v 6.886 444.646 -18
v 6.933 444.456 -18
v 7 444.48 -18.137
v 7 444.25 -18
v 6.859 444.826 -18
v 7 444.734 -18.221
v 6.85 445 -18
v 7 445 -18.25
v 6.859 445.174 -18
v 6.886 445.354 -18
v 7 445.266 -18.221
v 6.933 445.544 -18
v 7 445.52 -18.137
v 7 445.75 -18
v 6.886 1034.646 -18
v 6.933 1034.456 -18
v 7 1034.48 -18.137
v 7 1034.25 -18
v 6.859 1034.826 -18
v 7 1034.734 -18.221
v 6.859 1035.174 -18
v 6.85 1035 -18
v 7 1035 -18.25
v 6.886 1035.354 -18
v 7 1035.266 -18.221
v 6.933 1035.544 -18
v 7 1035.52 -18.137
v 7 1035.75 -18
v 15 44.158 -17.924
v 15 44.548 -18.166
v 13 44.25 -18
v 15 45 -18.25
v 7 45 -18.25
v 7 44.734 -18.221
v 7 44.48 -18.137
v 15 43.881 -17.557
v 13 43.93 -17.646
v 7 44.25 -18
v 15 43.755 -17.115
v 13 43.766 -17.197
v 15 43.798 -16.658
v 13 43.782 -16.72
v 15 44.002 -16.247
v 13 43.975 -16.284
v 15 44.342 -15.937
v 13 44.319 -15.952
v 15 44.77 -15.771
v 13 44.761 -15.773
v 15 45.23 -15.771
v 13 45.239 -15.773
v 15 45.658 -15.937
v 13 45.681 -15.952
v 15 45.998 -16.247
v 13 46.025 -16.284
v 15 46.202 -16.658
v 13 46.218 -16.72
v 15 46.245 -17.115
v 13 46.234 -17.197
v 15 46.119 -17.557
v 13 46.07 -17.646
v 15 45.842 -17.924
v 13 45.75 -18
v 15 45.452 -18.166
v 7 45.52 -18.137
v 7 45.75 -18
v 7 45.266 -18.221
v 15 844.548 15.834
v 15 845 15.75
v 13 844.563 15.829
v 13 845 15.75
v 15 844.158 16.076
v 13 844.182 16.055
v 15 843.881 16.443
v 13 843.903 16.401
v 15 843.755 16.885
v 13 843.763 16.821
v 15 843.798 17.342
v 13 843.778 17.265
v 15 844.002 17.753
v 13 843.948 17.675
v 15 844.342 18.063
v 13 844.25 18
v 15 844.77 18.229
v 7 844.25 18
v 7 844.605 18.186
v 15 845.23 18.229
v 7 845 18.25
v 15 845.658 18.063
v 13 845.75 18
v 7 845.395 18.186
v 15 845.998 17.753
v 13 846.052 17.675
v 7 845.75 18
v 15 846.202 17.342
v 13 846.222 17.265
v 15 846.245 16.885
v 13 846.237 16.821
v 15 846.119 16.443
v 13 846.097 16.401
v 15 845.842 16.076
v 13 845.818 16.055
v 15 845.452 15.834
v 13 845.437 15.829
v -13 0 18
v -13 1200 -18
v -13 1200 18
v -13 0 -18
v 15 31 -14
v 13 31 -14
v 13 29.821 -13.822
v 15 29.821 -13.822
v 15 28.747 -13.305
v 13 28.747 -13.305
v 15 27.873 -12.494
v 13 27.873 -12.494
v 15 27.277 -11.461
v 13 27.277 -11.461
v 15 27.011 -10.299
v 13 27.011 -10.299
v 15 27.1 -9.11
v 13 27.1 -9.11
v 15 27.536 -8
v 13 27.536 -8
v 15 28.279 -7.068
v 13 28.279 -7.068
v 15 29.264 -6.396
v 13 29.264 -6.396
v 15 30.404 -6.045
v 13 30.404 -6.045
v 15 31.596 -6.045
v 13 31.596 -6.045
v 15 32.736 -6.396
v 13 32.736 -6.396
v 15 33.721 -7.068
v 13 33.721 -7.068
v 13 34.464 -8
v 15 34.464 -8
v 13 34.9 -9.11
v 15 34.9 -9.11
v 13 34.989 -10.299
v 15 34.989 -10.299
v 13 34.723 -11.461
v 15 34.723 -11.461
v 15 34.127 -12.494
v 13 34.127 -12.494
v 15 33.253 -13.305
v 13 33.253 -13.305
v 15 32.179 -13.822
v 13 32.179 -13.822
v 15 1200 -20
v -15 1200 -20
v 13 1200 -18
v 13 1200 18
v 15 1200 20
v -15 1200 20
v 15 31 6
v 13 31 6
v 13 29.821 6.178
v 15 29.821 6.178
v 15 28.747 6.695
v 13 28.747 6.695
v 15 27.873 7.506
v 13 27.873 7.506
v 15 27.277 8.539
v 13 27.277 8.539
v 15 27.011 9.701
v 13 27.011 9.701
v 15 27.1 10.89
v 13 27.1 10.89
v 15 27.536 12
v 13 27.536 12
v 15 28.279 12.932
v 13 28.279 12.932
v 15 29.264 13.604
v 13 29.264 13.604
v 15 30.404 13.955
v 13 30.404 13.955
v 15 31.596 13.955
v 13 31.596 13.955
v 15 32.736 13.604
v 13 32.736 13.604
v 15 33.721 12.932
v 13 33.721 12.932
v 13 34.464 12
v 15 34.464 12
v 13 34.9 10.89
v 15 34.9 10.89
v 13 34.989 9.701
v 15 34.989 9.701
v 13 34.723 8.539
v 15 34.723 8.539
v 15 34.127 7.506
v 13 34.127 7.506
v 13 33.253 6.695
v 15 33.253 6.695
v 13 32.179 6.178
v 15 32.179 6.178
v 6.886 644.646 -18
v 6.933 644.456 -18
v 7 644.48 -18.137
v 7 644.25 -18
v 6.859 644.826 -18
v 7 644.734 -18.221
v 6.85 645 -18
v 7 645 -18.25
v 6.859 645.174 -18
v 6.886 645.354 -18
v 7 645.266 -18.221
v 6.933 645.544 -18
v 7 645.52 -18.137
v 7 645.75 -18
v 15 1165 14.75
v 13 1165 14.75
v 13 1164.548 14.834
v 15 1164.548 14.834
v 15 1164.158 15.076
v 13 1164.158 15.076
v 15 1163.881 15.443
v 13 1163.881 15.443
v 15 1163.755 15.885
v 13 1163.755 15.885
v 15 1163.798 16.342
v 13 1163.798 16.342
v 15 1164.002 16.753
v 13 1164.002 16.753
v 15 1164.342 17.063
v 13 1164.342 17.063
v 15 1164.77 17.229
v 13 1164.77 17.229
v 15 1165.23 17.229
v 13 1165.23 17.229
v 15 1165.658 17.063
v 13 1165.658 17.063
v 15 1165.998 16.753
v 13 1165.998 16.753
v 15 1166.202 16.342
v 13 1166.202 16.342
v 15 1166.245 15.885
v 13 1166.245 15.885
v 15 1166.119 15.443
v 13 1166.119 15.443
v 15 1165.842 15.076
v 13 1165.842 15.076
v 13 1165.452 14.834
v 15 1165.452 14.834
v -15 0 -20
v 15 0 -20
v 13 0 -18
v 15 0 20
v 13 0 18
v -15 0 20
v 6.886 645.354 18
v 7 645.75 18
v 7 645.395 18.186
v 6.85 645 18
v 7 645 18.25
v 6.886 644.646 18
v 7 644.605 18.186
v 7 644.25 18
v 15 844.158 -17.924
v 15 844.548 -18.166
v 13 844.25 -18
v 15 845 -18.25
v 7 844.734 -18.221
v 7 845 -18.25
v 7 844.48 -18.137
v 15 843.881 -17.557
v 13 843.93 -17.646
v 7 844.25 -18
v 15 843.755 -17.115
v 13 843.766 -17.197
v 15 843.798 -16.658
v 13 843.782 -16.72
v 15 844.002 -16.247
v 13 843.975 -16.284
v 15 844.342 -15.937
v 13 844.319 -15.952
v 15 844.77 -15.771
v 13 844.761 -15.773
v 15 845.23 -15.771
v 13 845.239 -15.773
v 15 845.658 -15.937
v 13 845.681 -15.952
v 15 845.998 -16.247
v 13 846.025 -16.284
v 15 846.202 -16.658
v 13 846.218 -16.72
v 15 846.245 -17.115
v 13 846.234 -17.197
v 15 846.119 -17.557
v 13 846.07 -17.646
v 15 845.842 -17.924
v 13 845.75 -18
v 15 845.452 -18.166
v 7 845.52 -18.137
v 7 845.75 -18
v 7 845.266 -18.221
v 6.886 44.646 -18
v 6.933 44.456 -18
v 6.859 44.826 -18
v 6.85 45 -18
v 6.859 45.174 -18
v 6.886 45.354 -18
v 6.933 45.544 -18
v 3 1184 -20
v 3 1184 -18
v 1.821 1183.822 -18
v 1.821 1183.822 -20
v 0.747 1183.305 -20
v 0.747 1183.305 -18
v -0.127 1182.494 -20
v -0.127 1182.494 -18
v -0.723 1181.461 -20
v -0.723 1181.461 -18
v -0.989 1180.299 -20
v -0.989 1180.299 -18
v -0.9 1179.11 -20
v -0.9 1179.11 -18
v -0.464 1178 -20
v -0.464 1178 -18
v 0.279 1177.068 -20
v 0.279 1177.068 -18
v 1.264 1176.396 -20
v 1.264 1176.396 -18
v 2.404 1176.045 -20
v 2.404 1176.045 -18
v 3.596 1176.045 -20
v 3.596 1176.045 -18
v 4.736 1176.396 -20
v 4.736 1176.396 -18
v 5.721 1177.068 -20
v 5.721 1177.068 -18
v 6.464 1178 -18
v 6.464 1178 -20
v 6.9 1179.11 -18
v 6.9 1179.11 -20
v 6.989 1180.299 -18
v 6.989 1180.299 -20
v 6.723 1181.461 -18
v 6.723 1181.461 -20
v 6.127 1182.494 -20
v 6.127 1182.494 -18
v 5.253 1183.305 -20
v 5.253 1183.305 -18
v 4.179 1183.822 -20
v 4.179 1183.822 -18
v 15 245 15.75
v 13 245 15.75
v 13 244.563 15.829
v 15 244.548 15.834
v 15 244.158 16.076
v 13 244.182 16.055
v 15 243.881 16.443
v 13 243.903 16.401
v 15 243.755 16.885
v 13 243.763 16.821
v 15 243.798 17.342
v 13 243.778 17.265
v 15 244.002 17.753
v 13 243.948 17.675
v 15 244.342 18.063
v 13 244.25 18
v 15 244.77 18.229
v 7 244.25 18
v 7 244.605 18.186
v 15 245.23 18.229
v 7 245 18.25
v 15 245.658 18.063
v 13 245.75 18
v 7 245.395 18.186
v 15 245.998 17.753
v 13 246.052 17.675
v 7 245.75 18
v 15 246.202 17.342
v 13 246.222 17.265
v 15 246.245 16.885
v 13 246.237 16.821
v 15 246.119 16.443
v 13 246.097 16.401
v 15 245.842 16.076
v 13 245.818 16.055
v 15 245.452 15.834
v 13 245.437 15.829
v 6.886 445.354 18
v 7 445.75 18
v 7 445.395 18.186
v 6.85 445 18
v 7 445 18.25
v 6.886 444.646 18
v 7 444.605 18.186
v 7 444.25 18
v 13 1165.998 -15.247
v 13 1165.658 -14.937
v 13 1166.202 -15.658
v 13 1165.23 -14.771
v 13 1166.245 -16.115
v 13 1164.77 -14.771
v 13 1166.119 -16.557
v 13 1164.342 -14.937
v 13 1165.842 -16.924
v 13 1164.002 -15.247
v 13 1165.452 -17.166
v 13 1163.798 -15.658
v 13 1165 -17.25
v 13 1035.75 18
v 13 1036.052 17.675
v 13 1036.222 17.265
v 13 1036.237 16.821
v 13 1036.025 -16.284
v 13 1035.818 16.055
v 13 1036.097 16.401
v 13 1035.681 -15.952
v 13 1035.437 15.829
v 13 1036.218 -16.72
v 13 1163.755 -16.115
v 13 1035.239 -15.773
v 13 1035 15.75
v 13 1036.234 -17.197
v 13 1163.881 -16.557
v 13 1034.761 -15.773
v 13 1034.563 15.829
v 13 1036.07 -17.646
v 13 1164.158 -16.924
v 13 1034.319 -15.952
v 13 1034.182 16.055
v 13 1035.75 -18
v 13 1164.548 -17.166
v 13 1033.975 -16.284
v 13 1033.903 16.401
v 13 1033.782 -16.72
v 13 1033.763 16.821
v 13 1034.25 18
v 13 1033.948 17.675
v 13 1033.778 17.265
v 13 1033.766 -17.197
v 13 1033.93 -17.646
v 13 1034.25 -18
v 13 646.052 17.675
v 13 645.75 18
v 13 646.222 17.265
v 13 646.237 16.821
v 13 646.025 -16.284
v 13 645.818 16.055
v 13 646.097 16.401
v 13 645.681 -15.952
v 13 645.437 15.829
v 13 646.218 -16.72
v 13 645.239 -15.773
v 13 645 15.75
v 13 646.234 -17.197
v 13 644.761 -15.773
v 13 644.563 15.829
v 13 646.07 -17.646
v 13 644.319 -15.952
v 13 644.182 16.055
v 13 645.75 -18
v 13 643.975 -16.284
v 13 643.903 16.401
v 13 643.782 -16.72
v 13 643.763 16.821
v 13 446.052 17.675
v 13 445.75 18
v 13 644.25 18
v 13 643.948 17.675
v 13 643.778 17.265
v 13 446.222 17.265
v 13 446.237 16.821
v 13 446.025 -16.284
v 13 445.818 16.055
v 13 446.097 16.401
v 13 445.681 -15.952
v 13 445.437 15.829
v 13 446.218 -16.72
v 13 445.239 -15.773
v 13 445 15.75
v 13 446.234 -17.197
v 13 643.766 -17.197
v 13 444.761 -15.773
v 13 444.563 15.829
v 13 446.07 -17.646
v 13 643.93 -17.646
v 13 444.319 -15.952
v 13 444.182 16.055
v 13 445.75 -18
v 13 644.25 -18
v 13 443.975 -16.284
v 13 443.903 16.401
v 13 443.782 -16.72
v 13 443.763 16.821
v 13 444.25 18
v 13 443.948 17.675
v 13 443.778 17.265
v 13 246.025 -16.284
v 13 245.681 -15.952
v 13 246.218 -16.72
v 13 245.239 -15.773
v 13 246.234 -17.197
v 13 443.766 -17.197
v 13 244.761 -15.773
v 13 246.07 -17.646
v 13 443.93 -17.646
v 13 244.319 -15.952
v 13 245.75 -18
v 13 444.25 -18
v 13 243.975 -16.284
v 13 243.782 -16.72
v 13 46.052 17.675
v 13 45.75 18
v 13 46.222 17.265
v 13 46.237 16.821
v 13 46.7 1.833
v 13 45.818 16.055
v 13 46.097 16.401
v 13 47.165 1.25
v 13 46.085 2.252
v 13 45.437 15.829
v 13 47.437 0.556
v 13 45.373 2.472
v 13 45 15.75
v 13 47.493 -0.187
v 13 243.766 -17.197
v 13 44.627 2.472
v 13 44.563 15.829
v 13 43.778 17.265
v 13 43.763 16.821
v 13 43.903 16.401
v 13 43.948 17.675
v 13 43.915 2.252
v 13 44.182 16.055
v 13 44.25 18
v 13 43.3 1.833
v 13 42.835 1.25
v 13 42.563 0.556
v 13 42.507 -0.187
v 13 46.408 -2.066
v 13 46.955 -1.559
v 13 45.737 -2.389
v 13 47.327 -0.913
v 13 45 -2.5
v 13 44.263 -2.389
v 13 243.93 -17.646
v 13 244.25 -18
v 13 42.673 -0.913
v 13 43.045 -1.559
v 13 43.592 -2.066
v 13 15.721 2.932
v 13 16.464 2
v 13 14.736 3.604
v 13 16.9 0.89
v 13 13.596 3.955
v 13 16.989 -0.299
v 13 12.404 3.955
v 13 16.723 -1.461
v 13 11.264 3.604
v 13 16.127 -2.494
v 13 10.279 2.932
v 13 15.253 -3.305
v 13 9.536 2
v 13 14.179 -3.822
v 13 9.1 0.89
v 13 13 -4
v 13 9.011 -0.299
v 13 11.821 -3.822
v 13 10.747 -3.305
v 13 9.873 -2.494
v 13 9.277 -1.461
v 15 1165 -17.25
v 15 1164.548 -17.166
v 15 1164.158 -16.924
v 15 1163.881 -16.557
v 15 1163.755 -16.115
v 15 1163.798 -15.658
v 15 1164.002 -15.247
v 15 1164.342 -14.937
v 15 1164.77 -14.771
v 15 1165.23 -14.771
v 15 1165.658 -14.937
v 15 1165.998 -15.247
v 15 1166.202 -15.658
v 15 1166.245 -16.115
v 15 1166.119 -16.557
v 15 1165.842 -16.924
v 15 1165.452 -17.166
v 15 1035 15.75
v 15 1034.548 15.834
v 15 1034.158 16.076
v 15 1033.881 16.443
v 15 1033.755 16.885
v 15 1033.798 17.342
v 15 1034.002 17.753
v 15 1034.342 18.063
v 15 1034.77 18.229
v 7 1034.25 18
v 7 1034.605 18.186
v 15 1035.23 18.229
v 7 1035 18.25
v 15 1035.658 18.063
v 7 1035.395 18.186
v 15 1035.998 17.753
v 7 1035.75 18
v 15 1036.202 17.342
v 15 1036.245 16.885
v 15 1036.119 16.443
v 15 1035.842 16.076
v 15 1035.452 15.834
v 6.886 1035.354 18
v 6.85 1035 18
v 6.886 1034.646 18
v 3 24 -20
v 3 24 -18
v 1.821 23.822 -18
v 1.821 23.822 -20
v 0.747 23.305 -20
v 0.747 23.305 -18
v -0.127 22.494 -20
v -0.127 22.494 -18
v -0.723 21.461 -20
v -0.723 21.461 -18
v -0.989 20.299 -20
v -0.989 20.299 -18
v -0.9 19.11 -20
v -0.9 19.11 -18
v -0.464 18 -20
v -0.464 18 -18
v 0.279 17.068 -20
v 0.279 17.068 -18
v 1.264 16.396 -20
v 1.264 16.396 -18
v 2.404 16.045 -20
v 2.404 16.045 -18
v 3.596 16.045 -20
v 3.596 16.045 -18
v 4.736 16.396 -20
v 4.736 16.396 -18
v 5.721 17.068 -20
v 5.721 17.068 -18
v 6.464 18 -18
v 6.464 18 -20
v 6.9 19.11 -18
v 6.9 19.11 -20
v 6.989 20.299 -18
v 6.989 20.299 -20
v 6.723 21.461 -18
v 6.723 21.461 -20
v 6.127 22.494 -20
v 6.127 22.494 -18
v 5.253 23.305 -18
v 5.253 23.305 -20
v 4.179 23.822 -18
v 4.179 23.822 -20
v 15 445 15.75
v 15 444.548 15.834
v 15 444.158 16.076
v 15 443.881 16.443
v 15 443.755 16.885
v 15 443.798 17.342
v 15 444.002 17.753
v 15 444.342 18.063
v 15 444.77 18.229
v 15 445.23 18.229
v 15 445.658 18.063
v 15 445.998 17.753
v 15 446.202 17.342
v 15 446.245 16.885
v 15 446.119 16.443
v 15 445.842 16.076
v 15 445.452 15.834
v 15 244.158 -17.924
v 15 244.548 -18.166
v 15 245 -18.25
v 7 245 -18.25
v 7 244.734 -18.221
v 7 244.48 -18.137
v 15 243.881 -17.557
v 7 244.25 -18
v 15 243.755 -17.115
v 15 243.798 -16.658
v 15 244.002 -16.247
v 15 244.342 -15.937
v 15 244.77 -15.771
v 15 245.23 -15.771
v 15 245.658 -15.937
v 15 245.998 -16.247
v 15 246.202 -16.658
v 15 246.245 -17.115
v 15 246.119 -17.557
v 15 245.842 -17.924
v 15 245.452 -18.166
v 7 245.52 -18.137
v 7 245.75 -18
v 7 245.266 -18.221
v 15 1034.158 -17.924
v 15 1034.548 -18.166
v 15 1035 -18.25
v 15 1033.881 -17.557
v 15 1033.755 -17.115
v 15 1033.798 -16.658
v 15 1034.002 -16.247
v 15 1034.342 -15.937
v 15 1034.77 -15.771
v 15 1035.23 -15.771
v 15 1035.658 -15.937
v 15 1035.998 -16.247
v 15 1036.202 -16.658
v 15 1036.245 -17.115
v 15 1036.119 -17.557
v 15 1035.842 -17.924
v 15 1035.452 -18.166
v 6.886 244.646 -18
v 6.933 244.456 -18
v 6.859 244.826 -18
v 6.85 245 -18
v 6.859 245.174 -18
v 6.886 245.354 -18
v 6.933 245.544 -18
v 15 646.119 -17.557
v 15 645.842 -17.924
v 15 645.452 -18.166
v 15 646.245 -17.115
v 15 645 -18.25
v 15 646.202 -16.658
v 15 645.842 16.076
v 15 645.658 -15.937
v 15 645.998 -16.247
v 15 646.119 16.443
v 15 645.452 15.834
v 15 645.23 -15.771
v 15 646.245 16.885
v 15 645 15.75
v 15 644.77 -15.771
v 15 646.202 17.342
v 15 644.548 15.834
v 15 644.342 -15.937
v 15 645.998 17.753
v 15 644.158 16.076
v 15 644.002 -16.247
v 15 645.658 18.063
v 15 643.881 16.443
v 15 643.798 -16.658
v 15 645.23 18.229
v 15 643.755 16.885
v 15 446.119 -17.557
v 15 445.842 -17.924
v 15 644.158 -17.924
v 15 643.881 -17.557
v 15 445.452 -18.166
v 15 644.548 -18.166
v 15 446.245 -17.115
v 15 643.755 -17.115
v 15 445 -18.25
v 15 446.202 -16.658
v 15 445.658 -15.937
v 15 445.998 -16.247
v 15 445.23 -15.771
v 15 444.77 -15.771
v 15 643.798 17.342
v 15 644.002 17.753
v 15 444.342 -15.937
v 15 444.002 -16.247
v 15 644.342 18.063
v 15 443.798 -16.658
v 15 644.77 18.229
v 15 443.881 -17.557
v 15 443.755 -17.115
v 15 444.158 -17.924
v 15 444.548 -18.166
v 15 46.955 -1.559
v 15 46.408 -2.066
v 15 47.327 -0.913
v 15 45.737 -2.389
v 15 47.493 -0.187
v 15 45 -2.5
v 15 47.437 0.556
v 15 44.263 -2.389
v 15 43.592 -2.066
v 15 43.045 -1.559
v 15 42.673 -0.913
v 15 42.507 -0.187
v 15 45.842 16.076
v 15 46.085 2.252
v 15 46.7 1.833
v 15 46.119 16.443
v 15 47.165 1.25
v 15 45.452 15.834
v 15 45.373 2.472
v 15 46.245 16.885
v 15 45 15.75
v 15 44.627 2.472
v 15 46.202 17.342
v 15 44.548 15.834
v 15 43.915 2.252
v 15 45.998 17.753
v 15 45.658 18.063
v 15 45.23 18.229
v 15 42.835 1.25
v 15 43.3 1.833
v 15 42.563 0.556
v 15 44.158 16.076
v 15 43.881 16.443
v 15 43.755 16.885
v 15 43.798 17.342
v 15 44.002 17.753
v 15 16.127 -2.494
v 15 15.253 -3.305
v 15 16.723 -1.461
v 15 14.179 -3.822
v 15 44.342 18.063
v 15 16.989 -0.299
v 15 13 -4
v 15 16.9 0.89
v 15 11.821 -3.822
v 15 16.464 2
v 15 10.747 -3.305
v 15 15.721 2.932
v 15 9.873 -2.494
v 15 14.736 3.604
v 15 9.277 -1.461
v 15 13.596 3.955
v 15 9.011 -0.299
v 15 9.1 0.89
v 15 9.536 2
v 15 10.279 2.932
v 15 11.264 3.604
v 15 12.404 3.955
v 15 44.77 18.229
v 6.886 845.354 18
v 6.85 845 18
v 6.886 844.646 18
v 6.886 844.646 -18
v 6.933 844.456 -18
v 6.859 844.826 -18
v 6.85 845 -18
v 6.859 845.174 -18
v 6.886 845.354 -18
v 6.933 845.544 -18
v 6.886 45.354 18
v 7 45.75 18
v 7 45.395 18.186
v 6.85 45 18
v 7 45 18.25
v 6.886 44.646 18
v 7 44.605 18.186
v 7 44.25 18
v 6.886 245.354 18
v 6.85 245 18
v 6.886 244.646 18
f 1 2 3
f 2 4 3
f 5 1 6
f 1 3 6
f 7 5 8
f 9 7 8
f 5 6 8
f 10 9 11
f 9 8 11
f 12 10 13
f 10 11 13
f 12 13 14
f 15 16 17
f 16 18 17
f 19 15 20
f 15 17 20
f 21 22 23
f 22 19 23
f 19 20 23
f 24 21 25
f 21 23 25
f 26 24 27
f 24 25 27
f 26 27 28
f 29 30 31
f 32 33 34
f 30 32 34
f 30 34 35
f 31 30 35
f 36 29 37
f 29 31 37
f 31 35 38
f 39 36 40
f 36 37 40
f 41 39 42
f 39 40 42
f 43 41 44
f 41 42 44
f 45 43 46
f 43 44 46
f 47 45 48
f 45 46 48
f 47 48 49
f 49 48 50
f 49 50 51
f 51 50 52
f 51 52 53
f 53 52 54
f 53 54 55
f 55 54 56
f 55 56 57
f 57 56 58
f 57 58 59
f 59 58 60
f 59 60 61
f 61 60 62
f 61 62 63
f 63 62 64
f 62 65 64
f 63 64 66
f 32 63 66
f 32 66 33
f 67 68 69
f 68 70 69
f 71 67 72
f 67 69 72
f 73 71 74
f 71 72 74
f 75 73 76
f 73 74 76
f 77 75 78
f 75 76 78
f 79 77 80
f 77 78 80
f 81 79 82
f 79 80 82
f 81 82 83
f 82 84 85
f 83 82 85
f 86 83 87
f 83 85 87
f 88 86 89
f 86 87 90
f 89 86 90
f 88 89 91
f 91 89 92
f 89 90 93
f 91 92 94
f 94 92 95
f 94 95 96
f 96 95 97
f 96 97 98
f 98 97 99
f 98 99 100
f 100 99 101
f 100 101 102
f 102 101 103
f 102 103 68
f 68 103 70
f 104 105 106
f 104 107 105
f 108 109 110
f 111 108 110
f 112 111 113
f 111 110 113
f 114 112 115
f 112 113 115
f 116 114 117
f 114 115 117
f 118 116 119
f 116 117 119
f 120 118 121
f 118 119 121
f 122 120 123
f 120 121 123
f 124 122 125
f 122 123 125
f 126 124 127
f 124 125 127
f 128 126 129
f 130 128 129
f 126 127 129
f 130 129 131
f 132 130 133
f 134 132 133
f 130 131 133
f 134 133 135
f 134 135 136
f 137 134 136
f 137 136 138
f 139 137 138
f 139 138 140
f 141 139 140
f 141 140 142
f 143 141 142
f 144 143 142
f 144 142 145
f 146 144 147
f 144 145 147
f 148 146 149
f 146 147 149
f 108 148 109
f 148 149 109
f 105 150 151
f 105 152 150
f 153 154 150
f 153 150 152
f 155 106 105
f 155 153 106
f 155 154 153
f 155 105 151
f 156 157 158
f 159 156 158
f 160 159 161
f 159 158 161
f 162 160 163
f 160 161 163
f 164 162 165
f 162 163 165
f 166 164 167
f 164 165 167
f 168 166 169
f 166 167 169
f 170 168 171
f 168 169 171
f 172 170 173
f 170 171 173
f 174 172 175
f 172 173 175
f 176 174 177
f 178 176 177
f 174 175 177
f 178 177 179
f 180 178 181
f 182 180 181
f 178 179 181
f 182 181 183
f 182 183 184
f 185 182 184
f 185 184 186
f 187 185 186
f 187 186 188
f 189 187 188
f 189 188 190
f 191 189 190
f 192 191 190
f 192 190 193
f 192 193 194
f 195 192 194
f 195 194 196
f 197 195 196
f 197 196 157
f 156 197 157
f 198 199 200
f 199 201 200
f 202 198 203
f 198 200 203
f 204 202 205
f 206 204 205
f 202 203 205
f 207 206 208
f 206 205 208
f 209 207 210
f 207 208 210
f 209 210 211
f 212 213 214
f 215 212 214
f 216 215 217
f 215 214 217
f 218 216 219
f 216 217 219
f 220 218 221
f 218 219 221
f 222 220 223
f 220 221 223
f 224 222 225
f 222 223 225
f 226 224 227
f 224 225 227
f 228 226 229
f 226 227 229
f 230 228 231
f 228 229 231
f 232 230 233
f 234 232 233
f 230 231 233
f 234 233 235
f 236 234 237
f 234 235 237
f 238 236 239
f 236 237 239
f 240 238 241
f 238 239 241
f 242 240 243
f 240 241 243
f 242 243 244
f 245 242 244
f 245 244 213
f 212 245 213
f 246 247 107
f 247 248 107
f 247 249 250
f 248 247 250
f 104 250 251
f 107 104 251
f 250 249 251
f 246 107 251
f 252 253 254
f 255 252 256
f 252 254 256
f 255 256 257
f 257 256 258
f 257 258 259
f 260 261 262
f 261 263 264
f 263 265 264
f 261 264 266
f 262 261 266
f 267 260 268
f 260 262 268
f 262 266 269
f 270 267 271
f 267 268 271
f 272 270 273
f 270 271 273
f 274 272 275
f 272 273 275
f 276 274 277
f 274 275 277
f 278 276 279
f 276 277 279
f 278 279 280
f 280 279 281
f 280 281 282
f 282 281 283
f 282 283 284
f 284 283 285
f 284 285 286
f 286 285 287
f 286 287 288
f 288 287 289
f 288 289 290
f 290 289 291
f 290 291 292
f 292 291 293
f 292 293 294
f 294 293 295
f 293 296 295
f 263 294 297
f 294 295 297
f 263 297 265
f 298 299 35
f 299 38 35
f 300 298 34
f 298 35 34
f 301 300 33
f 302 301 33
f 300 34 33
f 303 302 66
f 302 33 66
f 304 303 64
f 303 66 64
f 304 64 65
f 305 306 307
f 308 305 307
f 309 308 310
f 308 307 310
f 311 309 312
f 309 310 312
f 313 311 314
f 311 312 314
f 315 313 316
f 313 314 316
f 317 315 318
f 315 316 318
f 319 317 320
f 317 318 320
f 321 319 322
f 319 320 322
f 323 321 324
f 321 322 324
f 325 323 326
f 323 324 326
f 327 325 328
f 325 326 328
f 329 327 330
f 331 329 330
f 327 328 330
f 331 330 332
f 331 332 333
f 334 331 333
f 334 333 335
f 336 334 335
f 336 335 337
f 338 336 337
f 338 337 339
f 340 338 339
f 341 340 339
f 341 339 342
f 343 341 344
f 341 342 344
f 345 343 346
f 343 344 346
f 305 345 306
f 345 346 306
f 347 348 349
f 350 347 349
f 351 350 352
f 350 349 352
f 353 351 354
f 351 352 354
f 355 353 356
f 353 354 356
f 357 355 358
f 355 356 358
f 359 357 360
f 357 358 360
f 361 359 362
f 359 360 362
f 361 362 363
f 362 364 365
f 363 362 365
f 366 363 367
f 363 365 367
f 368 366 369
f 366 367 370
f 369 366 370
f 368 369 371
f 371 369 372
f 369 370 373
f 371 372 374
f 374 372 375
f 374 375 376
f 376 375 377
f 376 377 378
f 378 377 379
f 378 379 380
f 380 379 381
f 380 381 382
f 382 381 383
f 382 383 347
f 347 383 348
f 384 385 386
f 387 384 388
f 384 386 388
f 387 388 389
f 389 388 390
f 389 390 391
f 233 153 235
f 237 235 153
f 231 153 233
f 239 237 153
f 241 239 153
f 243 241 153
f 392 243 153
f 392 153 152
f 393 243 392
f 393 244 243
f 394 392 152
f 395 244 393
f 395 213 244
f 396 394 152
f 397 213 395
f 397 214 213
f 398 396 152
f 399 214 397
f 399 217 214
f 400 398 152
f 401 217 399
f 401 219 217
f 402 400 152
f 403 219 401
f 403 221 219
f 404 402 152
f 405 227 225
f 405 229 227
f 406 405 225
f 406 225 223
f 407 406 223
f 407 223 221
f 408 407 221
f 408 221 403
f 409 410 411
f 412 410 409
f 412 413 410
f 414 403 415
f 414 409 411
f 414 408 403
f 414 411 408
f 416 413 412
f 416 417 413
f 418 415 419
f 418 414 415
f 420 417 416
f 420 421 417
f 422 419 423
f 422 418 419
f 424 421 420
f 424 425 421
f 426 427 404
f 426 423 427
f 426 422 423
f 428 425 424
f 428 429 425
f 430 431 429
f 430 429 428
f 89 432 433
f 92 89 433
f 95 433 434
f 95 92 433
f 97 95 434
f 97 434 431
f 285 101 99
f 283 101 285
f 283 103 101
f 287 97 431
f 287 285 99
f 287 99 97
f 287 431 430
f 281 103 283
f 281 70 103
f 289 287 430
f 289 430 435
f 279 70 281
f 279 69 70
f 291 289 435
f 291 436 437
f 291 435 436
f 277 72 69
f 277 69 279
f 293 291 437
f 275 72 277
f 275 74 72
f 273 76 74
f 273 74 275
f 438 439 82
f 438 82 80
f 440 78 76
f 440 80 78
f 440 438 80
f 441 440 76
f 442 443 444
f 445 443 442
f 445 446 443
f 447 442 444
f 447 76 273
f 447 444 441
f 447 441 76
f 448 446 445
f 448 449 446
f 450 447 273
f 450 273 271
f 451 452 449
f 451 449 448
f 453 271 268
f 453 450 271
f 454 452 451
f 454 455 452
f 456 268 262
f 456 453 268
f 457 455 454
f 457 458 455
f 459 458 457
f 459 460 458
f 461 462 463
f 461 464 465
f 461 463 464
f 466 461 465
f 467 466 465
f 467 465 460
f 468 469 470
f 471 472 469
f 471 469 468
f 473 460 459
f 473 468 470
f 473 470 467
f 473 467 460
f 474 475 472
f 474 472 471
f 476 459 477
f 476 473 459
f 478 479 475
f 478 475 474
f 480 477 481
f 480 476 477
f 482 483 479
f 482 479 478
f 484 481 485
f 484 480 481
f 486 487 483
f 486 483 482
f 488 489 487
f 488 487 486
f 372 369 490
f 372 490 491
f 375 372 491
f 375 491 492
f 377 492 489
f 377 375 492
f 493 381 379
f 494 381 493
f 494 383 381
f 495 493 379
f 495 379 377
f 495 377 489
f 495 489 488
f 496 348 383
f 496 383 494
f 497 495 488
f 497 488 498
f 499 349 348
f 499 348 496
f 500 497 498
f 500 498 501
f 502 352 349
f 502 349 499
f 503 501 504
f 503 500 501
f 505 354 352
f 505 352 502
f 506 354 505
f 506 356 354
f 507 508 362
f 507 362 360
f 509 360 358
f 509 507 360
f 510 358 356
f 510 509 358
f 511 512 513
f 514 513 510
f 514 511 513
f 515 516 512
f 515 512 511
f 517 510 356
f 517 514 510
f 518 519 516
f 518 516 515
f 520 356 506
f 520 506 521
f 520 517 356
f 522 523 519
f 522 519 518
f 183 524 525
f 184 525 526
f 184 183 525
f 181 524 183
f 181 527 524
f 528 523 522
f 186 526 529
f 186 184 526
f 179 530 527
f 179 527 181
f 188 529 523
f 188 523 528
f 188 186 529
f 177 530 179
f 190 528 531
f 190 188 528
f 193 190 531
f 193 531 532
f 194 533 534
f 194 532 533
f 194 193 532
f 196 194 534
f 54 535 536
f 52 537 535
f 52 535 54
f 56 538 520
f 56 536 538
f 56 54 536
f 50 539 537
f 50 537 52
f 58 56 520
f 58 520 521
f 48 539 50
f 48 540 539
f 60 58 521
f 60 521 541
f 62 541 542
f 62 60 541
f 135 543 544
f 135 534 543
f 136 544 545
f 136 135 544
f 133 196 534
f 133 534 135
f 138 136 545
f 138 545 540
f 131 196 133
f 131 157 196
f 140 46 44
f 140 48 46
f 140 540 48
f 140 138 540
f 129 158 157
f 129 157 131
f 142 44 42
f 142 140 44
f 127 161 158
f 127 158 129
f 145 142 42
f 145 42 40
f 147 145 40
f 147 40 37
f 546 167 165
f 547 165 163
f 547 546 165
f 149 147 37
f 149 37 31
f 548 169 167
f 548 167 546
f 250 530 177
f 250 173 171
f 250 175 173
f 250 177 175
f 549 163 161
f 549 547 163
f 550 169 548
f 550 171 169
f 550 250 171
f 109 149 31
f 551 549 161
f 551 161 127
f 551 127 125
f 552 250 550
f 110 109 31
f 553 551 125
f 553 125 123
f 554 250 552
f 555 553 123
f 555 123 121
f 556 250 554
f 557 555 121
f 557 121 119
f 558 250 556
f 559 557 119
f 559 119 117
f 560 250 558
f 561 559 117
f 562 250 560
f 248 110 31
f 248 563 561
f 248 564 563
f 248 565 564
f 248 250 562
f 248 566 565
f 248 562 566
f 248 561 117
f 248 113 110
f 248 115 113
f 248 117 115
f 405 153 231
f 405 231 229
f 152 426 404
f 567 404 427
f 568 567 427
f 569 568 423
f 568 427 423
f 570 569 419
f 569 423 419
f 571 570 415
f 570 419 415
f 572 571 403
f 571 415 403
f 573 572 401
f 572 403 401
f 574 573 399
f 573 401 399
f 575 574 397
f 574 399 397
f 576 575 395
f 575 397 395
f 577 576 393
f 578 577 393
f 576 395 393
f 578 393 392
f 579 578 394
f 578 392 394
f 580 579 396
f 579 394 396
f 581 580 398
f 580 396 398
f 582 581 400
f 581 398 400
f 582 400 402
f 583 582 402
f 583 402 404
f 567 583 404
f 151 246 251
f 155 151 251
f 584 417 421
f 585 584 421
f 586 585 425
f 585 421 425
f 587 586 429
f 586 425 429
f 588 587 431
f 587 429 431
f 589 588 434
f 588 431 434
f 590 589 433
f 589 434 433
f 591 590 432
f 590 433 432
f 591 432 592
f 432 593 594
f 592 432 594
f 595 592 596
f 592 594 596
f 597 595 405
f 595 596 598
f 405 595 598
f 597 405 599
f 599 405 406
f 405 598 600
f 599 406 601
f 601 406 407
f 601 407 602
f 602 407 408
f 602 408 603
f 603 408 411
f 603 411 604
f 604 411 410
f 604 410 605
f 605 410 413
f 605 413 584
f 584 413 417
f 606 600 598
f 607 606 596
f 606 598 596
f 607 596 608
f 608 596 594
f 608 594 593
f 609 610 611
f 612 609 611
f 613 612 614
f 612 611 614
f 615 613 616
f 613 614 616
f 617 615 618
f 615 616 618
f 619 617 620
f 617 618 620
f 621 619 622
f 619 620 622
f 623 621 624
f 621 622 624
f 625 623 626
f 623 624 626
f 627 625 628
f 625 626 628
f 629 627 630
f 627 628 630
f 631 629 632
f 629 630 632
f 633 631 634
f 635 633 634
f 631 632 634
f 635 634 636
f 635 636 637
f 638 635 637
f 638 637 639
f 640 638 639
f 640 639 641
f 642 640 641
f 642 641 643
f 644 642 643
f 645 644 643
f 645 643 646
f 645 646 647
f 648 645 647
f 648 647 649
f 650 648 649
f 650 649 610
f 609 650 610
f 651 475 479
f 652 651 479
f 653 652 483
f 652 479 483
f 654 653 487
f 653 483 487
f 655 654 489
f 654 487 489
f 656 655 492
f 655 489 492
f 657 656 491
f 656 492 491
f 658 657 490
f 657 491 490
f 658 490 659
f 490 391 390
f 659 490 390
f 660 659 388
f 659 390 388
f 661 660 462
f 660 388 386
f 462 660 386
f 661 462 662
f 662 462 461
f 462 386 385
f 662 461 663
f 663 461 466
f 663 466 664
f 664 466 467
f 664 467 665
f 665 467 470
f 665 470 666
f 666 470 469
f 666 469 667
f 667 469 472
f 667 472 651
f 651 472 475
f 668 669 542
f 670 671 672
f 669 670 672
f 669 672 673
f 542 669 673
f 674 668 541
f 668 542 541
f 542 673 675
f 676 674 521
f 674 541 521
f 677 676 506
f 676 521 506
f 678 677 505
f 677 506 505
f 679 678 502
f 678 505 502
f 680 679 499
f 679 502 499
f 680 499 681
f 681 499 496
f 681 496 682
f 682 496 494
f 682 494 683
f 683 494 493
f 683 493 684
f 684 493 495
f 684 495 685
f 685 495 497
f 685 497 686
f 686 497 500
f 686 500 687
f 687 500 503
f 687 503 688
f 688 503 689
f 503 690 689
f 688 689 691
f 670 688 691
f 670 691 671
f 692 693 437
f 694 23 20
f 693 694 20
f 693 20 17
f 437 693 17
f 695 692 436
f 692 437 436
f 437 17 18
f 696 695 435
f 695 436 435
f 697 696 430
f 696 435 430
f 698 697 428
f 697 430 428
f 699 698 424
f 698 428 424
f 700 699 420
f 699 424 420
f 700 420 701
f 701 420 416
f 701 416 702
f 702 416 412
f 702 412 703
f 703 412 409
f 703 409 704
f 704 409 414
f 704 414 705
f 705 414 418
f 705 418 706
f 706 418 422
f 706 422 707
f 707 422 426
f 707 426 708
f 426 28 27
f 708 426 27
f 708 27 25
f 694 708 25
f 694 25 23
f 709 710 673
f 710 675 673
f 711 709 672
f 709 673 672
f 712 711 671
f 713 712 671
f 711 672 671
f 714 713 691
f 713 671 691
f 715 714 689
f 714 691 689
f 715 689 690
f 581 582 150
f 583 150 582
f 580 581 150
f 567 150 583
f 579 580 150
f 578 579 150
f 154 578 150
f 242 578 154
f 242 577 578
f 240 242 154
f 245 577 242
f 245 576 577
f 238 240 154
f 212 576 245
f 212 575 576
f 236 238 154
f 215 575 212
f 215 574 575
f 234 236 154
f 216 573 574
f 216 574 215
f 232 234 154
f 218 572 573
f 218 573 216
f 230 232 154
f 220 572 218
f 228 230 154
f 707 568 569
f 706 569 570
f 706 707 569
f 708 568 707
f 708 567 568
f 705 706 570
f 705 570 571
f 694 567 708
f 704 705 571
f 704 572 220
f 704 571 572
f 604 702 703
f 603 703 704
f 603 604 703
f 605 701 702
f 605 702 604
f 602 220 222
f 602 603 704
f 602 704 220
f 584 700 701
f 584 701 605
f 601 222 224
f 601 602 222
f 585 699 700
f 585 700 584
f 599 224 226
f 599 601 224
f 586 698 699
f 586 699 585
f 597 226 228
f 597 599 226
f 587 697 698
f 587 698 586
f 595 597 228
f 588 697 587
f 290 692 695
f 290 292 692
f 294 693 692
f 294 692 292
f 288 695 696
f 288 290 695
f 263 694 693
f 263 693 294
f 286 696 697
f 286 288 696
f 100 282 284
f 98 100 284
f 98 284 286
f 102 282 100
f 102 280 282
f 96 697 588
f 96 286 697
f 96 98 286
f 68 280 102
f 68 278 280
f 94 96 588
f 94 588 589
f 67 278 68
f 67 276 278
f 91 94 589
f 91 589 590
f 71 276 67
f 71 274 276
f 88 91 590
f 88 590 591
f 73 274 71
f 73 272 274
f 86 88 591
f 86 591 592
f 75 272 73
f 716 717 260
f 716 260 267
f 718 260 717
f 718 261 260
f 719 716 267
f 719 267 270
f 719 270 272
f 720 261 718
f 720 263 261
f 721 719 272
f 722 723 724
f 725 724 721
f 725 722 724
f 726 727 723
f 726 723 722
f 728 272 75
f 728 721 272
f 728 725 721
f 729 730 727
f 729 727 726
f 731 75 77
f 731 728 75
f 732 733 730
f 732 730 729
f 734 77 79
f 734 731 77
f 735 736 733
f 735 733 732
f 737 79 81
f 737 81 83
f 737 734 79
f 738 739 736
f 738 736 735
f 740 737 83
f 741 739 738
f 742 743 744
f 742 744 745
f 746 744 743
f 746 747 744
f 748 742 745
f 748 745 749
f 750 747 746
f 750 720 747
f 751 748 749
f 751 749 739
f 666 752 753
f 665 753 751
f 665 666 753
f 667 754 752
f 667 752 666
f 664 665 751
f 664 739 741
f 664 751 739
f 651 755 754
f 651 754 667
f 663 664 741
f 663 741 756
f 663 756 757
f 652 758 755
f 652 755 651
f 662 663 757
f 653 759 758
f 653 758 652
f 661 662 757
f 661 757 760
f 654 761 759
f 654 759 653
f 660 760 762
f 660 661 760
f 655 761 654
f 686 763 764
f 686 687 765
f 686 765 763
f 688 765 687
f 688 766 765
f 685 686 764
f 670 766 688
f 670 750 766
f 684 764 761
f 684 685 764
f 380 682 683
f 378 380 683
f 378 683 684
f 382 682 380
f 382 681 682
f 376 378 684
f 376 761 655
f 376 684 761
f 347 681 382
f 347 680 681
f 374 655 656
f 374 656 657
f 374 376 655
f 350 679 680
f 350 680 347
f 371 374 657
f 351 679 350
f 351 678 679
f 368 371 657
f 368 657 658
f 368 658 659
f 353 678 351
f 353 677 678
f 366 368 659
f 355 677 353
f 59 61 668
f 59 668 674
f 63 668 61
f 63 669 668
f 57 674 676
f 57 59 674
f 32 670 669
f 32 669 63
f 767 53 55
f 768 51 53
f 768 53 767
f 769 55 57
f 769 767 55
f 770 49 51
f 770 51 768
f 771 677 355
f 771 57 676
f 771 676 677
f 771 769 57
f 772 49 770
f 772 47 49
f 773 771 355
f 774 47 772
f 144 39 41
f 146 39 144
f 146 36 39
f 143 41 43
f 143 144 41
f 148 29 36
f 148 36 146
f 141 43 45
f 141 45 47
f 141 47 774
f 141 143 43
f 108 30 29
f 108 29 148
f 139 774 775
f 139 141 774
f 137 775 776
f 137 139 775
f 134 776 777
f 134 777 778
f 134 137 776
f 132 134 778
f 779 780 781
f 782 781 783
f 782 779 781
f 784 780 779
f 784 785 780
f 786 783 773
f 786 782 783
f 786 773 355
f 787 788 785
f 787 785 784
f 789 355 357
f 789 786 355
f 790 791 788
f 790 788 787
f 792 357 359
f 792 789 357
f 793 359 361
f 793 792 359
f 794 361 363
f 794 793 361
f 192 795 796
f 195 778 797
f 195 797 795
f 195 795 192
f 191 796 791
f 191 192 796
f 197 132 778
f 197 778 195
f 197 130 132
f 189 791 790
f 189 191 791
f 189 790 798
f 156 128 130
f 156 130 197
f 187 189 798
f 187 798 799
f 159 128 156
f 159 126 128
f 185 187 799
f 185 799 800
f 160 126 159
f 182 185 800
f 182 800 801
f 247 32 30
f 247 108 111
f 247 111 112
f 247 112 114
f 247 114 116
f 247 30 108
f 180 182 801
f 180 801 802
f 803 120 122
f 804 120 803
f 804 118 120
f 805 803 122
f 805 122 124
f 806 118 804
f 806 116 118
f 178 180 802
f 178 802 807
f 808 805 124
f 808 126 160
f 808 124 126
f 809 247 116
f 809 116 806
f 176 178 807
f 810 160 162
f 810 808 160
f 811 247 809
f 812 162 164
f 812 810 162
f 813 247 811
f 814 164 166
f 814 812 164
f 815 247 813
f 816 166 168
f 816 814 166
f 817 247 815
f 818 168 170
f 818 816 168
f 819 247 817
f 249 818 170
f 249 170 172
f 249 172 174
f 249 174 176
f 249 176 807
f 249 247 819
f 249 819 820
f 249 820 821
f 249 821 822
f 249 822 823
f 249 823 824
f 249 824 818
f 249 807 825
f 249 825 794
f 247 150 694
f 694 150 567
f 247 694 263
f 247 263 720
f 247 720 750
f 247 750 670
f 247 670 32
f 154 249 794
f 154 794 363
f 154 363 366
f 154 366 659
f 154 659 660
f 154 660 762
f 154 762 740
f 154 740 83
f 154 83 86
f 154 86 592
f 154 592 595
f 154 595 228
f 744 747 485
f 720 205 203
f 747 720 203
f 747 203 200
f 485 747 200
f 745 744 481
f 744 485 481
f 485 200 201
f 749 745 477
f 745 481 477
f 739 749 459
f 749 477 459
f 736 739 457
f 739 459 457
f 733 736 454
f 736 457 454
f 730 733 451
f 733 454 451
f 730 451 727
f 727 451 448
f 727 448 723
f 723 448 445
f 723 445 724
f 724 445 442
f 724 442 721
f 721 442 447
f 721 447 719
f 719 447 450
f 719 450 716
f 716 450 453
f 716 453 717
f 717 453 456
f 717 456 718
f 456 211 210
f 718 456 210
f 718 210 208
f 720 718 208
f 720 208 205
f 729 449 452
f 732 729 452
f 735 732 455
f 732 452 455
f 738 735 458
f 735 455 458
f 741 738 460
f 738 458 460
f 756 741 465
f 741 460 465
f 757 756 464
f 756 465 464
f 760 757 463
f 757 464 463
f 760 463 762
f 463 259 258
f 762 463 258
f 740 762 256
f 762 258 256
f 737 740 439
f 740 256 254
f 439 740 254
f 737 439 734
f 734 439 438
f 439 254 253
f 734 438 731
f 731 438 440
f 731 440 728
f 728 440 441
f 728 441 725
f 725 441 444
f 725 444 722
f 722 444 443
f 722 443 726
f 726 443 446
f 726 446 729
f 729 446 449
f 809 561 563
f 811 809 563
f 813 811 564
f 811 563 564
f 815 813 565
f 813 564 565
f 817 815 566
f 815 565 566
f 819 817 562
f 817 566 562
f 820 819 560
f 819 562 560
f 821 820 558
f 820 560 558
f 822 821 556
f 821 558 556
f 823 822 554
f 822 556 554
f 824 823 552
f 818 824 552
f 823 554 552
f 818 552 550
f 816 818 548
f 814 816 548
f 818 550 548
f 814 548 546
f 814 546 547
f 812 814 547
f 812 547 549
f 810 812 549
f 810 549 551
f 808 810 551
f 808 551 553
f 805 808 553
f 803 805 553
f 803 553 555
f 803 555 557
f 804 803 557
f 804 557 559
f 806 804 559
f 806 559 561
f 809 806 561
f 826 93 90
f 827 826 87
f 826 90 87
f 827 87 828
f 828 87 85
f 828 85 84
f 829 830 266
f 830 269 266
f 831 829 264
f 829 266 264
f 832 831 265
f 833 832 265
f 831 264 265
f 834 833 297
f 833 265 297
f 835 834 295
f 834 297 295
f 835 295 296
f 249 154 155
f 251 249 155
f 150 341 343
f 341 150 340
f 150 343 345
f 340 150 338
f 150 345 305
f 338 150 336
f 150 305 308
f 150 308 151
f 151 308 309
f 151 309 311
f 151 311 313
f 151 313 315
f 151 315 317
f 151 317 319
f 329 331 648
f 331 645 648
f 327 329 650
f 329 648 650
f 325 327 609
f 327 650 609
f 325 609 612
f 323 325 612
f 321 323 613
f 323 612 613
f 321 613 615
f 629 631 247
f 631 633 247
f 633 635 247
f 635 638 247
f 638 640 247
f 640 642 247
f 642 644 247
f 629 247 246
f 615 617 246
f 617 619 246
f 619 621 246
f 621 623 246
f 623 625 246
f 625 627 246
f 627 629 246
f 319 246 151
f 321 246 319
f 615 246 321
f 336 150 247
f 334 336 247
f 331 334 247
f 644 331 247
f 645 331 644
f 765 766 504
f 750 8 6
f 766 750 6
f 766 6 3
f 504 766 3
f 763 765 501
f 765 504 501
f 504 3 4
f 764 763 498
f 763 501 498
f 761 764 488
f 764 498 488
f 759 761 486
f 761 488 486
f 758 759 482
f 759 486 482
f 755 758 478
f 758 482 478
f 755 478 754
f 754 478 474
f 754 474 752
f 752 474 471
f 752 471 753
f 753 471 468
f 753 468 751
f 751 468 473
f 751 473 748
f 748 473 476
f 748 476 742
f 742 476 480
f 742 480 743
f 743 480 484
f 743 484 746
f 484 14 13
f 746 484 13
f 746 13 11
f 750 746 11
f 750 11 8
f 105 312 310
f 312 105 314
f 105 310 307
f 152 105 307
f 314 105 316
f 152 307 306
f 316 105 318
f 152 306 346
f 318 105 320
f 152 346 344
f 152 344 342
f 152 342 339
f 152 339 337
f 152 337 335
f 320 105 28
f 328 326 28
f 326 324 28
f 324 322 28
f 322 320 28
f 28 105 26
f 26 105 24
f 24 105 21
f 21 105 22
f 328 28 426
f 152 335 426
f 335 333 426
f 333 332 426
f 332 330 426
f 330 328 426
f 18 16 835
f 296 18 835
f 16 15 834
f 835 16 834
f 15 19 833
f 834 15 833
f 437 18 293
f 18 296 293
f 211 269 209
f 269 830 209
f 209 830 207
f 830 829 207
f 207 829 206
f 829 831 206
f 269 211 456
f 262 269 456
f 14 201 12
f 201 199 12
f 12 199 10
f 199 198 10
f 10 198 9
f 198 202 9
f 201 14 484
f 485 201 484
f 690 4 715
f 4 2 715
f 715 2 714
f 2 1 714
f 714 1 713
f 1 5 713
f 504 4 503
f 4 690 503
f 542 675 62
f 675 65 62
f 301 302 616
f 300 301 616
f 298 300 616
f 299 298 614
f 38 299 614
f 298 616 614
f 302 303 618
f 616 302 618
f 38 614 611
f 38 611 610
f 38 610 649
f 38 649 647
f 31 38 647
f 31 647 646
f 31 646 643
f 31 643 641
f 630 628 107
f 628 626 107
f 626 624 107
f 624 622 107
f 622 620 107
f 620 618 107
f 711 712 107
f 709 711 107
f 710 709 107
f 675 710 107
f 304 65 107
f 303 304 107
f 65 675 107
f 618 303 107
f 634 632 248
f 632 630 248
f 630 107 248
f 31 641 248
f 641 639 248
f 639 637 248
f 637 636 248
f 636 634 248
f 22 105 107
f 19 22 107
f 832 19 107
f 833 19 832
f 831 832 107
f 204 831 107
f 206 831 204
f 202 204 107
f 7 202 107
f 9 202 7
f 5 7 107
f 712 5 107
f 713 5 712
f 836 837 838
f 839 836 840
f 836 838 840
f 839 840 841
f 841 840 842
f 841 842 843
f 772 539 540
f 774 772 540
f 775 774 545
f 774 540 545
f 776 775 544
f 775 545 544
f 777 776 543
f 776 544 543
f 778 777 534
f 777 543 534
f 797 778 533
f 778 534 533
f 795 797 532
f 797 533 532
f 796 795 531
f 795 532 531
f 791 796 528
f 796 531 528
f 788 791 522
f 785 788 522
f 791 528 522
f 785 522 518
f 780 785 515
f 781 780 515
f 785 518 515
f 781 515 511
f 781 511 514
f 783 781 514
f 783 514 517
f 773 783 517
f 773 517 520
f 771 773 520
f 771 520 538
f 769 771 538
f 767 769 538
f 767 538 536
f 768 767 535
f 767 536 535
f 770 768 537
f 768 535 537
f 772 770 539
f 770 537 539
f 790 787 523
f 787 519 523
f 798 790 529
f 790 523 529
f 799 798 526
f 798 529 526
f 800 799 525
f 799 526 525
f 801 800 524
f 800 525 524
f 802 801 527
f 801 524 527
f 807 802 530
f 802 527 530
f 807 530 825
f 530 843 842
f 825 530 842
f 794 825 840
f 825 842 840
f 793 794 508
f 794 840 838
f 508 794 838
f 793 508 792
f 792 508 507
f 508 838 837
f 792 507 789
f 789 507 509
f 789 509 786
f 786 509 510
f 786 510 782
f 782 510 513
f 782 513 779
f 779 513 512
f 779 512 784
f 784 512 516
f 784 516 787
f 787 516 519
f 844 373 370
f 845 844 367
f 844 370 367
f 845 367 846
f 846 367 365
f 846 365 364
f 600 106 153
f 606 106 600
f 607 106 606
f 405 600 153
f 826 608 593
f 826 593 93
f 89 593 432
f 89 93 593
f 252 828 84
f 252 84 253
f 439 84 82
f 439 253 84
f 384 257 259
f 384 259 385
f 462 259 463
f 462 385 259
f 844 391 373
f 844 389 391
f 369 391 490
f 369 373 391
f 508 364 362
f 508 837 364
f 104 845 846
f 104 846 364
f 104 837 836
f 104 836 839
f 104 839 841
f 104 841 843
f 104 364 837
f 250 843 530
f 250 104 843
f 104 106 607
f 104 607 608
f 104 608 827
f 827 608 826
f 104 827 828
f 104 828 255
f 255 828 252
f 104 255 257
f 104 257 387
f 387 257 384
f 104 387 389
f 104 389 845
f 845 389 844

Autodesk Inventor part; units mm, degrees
ref_plane "YZ Plane" through (0, 0, 0) normal (1, 0, 0) x (0, 1, 0)
ref_plane "XZ Plane" through (0, 0, 0) normal (0, 1, 0) x (-1, 0, 0)
ref_plane "XY Plane" through (0, 0, 0) normal (0, 0, 1) x (1, 0, 0)
sketch "Szkic2" plane through (0, 0, 0) normal (0, 1, 0) x (-1, 0, 0)
  line L0 (0, 0) -> (-15, 0) construction
  line L1 (-15, 0) -> (-15, 20)
  line L2 (-15, 20) -> (0, 20)
  line L3 (-15, 0) -> (-15, -20)
  line L4 (-15, -20) -> (0, -20)
  line L5 (0, -20) -> (0, 20) construction
  line L6 (15, 0) -> (15, 20)
  line L7 (15, 20) -> (0, 20)
  line L8 (15, -20) -> (0, -20)
  line L9 (15, 0) -> (15, -20)
  line L10 (15, 0) -> (13, 0) construction
  line L11 (0, 20) -> (0, 18) construction
  line L12 (0, 18) -> (13, 18)
  line L13 (13, 18) -> (13, 0)
  line L14 (0, 18) -> (-13, 18)
  line L15 (-13, 18) -> (-13, 0)
  line L16 (0, -18) -> (13, -18)
  line L17 (13, -18) -> (13, 0)
  line L18 (-13, -18) -> (-13, 0)
  line L19 (0, -18) -> (-13, -18)
  point P0 (-7.5, -20)
  point P1 (15, -10)
  dimension "d18" = 40
  dimension "d19" = 30
  dimension "d22" = 2
  dimension "d23" = 2
extrude "Wyciągnięcie proste4" add sketch "Szkic2" along normal blind 1200
sketch "Szkic3" plane through (15, 0, -20) normal (0, 0, -1) x (-1, 0, 0)
  line L0 (0, 1200) -> (0, 1180) construction
  line L1 (0, 0) -> (0, 1200) projected
  line L2 (0, 1180) -> (12, 1180) construction
  line L3 (12, 1180) -> (12, 0)
  line L4 (0, 0) -> (0, 1200) projected
  line L5 (0, 0) -> (0, 20)
  line L6 (0, 20) -> (12, 20)
  point P0 (15, 0)
  dimension "d26" = 20
  dimension "d27" = 12
  dimension "d76" = 1180
  dimension "d77" = 20
hole "Otwór1" at (3, 1180, -20) at (3, 20, -20) direction (0, 0, 1) diameter 8 depth 10 tip angle 118
sketch "Szkic4" plane through (15, 0, 20) normal (1, 0, 0) x (0, 0, -1)
  line L0 (40, 0) -> (0, 0) projected
  line L1 (0, 0) -> (10, 0)
  line L2 (40, 0) -> (30, 0)
  line L3 (0, 0) -> (0, 31)
  line L4 (0, 0) -> (0, 1200) projected
  line L5 (0, 31) -> (10, 31)
  line L6 (40, 0) -> (40, 1200) projected
  line L7 (40, 0) -> (40, 31)
  line L8 (30, 31) -> (40, 31)
  line L9 (40, 31) -> (40, 0)
  line L10 (0, 0) -> (0, 40)
  line L11 (20, 0) -> (20, 13)
  dimension "d35" = 10
  dimension "d36" = 10
  dimension "d37" = 31
  dimension "d38" = 20
  dimension "d39" = 31
  dimension "d40" = 10
  dimension "d41" = 40
  dimension "d42" = 13
hole "Otwór2" at (15, 31, 10) at (15, 31, -10) at (15, 13, 0) direction (-1, 0, 0) diameter 8 depth 8.25 tip angle 118
sketch "Szkic5" plane through (15, 0, 20) normal (1, 0, 0) x (0, 0, -1)
  line L0 (40, 0) -> (0, 0) projected
  line L1 (0, 0) -> (0, 45)
  line L2 (0, 0) -> (0, 1200) projected
  line L3 (0, 45) -> (20, 45)
  point P0 (20, 0)
  dimension "d50" = 45
hole "Otwór3" at (15, 45, 0) direction (-1, 0, 0) diameter 5 depth 8 tip angle 118
sketch "Szkic6" plane through (15, 0, 20) normal (1, 0, 0) x (0, 0, -1)
  line L0 (0, 0) -> (0, 1200) projected
  circle A0 centre (20, 45) radius 2.5 projected
  line L1 (0, 45) -> (3, 45)
  line L2 (3, 45) -> (3, 245)
  line L3 (3, 245) -> (3, 445)
  line L4 (3, 445) -> (3, 645)
  line L5 (3, 645) -> (3, 845)
  line L6 (3, 845) -> (3, 1035)
  line L7 (40, 1200) -> (0, 1200) projected
  line L8 (20, 0) -> (20, 1200)
  line L9 (0, 1165) -> (4, 1165)
  point P0 (2, 1200)
  point P1 (37, 45)
  point P2 (37, 245)
  point P3 (37, 445)
  point P4 (37, 645)
  point P5 (37, 845)
  point P6 (37, 1035)
  point P7 (36, 1165)
  dimension "d58" = 20
  dimension "d59" = 3
  dimension "d60" = 200
  dimension "d61" = 200
  dimension "d62" = 200
  dimension "d63" = 200
  dimension "d64" = 190
  dimension "d73" = 35
  dimension "d75" = 4
hole "Otwór4" at (15, 45, 17) at (15, 245, 17) at (15, 445, 17) at (15, 645, 17) at (15, 845, 17) at (15, 1035, 17) at (15, 1165, 16) at (15, 1165, -16) at (15, 1035, -17) at (15, 845, -17) at (15, 645, -17) at (15, 445, -17) at (15, 245, -17) at (15, 45, -17) direction (-1, 0, 0) diameter 2.5 depth 8 tip angle 118
properties part number "profil_stalowy_40_30_120"
